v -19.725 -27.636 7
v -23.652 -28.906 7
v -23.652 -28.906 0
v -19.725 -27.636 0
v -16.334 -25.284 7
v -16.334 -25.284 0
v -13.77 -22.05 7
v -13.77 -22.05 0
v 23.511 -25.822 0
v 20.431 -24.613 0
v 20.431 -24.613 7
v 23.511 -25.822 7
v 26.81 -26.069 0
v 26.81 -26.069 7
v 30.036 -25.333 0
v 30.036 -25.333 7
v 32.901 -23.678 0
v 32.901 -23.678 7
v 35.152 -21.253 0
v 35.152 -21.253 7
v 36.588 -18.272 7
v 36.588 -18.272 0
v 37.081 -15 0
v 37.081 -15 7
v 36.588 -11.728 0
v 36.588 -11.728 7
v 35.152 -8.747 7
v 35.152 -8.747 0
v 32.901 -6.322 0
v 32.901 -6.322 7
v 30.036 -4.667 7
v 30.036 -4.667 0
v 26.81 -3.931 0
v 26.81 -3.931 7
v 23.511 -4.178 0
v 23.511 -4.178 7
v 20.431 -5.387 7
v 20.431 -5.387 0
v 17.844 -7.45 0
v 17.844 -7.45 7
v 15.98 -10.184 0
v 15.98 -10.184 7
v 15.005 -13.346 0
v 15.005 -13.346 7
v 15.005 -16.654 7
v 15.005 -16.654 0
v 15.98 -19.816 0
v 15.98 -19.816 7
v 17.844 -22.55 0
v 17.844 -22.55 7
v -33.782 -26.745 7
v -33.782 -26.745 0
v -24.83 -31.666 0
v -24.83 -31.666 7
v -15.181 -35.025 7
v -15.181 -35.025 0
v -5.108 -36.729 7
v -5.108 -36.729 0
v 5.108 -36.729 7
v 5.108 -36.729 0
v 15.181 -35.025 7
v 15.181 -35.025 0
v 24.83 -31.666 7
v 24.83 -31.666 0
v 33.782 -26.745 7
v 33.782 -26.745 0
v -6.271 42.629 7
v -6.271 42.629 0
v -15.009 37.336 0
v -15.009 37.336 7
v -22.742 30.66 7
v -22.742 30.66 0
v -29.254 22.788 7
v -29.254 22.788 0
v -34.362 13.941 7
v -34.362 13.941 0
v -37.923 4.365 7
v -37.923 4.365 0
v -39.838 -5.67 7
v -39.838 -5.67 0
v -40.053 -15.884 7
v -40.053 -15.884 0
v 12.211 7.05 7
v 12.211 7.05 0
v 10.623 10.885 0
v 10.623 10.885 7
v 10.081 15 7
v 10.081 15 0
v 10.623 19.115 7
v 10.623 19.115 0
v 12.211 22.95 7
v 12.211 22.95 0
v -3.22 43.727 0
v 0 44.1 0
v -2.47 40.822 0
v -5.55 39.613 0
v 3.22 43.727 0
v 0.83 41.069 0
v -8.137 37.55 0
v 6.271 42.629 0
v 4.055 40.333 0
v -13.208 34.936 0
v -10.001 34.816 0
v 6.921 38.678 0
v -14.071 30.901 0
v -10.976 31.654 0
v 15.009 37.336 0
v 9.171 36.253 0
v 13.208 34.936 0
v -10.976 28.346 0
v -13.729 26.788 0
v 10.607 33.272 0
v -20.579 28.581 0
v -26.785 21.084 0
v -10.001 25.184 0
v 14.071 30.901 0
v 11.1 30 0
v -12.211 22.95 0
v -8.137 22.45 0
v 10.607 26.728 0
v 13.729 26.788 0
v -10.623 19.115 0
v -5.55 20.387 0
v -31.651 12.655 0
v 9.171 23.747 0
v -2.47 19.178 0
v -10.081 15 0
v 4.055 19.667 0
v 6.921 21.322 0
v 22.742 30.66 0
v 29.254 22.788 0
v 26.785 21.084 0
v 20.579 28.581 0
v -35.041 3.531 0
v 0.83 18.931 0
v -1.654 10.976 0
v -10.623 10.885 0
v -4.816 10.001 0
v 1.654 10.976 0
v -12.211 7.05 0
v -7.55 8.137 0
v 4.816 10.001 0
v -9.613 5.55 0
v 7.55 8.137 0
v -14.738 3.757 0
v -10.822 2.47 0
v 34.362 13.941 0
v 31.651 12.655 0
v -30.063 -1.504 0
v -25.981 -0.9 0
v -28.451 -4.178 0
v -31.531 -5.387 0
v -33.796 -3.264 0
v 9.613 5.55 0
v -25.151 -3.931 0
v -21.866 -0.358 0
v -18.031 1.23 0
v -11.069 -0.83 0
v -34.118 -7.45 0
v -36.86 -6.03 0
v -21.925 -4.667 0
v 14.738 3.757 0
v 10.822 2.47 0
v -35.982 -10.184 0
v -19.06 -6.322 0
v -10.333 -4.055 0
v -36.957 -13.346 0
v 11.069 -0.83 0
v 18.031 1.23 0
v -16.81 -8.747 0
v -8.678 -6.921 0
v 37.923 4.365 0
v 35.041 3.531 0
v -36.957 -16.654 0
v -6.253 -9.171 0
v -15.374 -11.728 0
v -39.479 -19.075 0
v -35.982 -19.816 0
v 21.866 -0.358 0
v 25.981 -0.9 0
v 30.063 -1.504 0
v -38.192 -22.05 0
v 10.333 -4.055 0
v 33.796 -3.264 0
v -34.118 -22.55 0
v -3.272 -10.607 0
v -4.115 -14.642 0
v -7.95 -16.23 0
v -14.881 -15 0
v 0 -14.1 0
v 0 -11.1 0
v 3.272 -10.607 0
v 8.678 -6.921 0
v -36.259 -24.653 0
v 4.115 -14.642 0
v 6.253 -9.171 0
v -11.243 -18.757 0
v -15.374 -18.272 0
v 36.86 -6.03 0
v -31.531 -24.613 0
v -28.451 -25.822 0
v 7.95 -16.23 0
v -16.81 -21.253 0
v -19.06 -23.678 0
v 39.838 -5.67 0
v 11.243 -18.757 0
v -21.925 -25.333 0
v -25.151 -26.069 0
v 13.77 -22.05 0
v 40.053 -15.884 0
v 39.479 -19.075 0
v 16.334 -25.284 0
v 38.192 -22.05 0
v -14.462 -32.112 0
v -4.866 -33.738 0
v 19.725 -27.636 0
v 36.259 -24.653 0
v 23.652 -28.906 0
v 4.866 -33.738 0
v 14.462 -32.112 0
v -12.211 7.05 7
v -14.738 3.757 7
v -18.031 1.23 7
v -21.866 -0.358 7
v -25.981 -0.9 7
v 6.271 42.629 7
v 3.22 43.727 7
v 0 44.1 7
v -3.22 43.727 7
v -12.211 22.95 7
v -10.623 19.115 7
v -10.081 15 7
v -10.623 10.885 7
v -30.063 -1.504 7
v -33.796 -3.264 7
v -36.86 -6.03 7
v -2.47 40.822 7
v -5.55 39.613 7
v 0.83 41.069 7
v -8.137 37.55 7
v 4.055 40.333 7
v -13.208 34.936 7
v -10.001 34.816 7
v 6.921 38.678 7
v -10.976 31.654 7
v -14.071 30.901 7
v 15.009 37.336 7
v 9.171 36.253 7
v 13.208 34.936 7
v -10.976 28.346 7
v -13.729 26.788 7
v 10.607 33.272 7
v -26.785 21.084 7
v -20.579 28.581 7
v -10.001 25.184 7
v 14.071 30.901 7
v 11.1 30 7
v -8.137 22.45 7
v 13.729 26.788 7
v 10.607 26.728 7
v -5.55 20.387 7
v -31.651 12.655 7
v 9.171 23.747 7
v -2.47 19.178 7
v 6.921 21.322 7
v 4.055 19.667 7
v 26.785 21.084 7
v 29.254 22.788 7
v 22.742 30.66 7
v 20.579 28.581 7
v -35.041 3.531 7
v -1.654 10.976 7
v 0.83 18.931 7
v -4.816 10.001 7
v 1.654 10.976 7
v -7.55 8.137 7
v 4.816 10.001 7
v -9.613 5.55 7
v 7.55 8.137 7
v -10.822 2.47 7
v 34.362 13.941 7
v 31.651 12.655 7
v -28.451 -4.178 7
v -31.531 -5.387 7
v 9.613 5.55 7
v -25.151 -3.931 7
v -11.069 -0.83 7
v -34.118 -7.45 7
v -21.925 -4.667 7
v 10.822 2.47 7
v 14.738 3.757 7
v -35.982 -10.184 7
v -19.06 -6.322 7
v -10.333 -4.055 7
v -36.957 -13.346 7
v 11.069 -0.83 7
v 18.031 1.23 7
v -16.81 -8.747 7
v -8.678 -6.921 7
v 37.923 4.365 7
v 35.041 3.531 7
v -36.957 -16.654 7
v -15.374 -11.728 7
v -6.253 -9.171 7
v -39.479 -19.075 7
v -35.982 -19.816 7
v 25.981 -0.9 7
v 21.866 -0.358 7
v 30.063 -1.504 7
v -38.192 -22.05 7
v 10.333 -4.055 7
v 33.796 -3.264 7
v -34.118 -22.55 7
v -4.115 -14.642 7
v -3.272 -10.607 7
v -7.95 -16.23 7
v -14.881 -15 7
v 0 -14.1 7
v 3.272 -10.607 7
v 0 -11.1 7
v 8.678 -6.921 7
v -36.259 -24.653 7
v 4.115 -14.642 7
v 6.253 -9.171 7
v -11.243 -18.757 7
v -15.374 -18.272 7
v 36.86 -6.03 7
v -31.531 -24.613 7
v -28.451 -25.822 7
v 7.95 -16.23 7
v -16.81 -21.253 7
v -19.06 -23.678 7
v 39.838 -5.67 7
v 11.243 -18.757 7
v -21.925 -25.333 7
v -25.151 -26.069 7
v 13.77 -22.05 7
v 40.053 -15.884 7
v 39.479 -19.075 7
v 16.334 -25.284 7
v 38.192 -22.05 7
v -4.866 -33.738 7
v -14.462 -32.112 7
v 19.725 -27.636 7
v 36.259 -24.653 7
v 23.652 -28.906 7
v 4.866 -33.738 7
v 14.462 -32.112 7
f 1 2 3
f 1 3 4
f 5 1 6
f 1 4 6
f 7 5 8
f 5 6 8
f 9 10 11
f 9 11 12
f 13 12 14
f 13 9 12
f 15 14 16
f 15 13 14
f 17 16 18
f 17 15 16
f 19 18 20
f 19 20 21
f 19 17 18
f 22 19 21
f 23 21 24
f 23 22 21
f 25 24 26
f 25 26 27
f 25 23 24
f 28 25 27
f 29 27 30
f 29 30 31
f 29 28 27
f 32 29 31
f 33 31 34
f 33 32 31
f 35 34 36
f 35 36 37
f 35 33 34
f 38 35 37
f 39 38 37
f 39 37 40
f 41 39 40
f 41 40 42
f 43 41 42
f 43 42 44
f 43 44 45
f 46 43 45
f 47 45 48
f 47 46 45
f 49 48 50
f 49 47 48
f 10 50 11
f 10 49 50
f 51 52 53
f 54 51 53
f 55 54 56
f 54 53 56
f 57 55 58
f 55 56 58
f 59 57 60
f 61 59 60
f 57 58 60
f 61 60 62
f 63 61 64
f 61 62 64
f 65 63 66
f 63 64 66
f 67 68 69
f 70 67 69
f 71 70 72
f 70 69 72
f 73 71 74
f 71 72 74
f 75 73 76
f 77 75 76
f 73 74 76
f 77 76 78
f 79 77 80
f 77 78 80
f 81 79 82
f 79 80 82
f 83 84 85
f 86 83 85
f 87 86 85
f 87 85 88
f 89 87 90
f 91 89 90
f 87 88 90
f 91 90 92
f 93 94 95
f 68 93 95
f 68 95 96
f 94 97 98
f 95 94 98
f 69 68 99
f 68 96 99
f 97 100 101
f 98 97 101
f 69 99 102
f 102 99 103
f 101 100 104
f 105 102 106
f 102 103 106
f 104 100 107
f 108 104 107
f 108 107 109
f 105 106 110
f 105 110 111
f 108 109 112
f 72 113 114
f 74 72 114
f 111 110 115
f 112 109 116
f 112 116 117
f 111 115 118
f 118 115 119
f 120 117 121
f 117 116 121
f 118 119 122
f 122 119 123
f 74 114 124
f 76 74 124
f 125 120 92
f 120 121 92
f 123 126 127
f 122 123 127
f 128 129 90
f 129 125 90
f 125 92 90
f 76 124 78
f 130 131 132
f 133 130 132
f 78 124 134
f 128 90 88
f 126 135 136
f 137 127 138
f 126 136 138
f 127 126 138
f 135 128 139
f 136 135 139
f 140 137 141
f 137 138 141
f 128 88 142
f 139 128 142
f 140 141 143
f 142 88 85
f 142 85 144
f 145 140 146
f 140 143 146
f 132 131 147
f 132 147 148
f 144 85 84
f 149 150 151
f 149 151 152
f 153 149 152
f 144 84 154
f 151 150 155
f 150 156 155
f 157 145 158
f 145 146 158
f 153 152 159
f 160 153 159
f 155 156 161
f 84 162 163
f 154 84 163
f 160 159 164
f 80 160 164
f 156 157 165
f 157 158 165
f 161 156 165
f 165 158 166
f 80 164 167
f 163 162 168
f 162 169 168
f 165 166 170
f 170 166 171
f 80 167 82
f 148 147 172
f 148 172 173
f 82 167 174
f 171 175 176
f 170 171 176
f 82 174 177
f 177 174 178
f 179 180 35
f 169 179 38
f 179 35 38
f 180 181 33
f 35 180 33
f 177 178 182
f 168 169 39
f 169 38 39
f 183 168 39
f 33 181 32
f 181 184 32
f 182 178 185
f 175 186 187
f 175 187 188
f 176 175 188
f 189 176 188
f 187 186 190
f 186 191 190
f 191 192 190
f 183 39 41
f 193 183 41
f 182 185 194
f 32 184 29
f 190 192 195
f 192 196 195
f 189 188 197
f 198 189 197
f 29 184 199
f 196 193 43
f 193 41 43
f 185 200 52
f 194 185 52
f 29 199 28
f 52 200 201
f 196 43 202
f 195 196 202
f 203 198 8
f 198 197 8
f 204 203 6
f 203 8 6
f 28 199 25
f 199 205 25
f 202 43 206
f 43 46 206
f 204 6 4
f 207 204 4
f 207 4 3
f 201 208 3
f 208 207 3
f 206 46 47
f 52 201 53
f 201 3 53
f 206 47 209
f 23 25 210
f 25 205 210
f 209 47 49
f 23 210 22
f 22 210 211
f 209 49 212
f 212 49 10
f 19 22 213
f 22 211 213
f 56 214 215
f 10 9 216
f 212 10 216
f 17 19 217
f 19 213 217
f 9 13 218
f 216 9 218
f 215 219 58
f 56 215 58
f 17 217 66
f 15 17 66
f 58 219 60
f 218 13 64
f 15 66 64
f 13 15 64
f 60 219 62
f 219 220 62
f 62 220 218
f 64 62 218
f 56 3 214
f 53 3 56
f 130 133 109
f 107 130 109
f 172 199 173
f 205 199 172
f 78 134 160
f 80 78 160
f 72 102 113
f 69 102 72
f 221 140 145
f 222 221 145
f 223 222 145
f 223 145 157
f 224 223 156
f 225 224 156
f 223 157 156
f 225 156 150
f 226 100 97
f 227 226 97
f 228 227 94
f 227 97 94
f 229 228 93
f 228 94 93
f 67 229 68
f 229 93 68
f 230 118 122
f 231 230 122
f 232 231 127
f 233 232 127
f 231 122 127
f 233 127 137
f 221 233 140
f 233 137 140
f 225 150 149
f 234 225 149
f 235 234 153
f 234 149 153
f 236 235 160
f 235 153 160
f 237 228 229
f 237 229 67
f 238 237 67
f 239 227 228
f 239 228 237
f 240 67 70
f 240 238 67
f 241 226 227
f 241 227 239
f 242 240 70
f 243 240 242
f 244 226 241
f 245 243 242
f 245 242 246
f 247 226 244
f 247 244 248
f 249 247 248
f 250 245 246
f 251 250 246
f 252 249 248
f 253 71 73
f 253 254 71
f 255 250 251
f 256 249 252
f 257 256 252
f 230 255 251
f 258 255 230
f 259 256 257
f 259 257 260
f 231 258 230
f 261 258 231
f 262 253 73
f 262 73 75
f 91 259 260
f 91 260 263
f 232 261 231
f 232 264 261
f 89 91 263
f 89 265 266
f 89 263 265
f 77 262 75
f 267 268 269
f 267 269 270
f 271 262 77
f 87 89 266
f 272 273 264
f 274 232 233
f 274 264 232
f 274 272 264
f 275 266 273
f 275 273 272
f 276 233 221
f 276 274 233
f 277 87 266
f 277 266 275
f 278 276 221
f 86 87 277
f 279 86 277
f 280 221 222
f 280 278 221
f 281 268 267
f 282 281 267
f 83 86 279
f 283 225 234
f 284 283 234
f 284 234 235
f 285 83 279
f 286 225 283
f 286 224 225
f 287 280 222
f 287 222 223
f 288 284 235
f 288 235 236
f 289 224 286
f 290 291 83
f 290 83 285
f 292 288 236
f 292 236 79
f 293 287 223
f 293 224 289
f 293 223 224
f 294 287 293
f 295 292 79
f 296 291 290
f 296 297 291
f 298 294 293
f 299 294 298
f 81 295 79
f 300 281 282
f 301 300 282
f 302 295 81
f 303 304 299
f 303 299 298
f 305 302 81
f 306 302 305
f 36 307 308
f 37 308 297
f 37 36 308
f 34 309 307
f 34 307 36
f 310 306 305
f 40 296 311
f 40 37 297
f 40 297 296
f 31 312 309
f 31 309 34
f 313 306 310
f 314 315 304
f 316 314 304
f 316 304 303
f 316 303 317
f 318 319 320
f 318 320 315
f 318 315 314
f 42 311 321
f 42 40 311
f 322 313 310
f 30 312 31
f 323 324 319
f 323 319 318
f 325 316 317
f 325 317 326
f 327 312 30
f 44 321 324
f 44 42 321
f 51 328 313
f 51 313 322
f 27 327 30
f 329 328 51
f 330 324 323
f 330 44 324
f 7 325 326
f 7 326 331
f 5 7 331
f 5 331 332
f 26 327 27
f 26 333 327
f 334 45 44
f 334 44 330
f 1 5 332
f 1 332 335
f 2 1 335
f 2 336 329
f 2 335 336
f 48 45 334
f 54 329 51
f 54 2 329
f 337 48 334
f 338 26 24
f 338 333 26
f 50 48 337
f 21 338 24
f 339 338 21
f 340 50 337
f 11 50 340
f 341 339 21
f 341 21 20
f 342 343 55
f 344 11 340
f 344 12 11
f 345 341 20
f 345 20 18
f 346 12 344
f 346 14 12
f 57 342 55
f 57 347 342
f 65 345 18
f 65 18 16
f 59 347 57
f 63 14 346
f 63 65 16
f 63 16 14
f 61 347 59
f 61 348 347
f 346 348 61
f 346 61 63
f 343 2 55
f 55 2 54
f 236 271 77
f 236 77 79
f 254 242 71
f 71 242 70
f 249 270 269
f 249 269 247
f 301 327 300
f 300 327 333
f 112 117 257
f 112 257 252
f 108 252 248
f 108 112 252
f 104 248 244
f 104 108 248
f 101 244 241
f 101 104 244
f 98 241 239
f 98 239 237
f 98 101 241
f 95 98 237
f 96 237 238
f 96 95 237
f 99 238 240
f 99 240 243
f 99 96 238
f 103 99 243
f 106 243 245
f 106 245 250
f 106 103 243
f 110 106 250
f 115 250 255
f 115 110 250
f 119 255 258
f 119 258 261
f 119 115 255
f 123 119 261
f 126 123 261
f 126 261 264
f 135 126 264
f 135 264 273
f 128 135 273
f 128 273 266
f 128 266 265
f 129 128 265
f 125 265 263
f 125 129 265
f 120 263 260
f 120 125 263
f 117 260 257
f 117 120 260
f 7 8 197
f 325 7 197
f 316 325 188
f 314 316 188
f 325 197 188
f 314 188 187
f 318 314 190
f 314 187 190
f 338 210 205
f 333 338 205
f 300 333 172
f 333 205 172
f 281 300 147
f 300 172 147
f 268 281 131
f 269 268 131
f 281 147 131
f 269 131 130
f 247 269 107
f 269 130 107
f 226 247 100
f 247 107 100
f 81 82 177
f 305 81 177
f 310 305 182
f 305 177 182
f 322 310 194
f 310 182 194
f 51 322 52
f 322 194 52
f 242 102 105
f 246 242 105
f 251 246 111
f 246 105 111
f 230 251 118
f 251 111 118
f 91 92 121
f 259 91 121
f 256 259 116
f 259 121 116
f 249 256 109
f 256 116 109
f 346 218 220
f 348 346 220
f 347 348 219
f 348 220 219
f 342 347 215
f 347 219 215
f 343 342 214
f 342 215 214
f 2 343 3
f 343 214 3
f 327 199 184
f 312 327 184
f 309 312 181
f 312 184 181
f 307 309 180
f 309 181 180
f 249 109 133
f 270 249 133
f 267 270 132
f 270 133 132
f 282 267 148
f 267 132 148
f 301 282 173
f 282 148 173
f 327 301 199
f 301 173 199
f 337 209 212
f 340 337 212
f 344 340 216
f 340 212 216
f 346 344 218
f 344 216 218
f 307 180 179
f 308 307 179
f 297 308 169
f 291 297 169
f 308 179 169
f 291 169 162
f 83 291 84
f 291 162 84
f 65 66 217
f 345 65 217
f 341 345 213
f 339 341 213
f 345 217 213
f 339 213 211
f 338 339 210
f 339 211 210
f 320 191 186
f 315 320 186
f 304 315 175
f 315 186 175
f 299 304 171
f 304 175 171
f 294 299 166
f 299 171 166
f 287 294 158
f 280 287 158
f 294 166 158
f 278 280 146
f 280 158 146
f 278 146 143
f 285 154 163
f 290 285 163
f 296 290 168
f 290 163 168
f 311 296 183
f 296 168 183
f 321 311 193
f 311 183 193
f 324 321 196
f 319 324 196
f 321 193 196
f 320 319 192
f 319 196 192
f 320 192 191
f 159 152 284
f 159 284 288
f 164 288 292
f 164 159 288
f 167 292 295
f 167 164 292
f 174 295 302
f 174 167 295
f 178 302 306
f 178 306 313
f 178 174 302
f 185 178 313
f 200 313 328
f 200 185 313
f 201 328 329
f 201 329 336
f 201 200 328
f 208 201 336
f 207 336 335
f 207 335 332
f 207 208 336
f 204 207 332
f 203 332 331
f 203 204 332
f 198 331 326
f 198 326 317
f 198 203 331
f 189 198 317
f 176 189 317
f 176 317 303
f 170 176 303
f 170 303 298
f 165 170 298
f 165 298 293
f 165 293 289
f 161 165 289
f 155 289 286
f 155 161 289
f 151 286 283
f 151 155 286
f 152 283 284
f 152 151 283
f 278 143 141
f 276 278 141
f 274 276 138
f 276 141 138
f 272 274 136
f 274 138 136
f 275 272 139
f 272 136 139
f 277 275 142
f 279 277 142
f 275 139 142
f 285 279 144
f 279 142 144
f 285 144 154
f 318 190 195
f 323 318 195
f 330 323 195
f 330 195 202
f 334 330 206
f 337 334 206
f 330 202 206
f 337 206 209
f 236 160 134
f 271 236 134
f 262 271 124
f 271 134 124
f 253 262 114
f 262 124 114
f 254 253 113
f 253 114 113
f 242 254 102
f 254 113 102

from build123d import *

# Parameters (mm, degrees)
F0_R            = 11.1
F1_DEPTH        = 7
F2_COUNT        = 3
F4_DEPTH        = 7
F4_COPIES_COUNT = 3


# Not quite as in the source:
# - a pattern or mirror of a feature is missing from the dataset's text; its kind, count and spacing are read off the source's solid


with BuildPart() as f1:
    # F0 (on Top) → F1 (new body)
    with BuildSketch(Plane.XY):
        with BuildLine():
            ThreePointArc((-9.612881982, 5.55), (0, 11.1), (9.612881982, 5.55))
            Line((9.612881982, 5.55), (12.2109581934, 7.05))
            ThreePointArc((12.2109581934, 7.05), (10.0807621135, 15), (12.2109581934, 22.95))
            ThreePointArc((12.2109581934, 22.95), (0, 44.1), (-12.2109581934, 22.95))
            ThreePointArc((-12.2109581934, 22.95), (-10.0807621135, 15), (-12.2109581934, 7.05))
            Line((-12.2109581934, 7.05), (-9.612881982, 5.55))
        make_face()
        with Locations((0, 30)):
            Circle(F0_R, mode=Mode.SUBTRACT)
    extrude(amount=F1_DEPTH)

    # F2: F1 ×3 about axis
    f2_axis = Axis((0, 0, 0), (0, 0, 1))


with BuildPart() as f1_1:
    add(f1.part)
    for i in range(1, F2_COUNT):
        add(f1.part.rotate(f2_axis, i * 360 / F2_COUNT))

    # F3 (on face) → F4 (join)
    with BuildSketch(Plane.XY):
        with BuildLine():
            Line((36.8595294383, -6.0299151903), (40.0530223584, -15.8840201358))
            ThreePointArc((40.0530223584, -15.8840201358), (31.9933329124, 18.4713593692), (6.2705462274, 42.6289449286))
            ThreePointArc((6.2705462274, 42.6289449286), (10.4711494103, 39.4427236552), (13.2077049817, 34.9362464602))
            ThreePointArc((13.2077049817, 34.9362464602), (29.395256701, 16.9713593692), (36.8595294383, -6.0299151903))
        make_face()
    f4 = extrude(amount=F4_DEPTH)

    # F4_copies: F4 ×3 about axis
    f4_copies_axis = Axis((0, 0, 0), (0, 0, 1))
    for i in range(1, F4_COPIES_COUNT):
        add(f4.rotate(f4_copies_axis, i * 360 / F4_COPIES_COUNT))


solid = f1_1.part
